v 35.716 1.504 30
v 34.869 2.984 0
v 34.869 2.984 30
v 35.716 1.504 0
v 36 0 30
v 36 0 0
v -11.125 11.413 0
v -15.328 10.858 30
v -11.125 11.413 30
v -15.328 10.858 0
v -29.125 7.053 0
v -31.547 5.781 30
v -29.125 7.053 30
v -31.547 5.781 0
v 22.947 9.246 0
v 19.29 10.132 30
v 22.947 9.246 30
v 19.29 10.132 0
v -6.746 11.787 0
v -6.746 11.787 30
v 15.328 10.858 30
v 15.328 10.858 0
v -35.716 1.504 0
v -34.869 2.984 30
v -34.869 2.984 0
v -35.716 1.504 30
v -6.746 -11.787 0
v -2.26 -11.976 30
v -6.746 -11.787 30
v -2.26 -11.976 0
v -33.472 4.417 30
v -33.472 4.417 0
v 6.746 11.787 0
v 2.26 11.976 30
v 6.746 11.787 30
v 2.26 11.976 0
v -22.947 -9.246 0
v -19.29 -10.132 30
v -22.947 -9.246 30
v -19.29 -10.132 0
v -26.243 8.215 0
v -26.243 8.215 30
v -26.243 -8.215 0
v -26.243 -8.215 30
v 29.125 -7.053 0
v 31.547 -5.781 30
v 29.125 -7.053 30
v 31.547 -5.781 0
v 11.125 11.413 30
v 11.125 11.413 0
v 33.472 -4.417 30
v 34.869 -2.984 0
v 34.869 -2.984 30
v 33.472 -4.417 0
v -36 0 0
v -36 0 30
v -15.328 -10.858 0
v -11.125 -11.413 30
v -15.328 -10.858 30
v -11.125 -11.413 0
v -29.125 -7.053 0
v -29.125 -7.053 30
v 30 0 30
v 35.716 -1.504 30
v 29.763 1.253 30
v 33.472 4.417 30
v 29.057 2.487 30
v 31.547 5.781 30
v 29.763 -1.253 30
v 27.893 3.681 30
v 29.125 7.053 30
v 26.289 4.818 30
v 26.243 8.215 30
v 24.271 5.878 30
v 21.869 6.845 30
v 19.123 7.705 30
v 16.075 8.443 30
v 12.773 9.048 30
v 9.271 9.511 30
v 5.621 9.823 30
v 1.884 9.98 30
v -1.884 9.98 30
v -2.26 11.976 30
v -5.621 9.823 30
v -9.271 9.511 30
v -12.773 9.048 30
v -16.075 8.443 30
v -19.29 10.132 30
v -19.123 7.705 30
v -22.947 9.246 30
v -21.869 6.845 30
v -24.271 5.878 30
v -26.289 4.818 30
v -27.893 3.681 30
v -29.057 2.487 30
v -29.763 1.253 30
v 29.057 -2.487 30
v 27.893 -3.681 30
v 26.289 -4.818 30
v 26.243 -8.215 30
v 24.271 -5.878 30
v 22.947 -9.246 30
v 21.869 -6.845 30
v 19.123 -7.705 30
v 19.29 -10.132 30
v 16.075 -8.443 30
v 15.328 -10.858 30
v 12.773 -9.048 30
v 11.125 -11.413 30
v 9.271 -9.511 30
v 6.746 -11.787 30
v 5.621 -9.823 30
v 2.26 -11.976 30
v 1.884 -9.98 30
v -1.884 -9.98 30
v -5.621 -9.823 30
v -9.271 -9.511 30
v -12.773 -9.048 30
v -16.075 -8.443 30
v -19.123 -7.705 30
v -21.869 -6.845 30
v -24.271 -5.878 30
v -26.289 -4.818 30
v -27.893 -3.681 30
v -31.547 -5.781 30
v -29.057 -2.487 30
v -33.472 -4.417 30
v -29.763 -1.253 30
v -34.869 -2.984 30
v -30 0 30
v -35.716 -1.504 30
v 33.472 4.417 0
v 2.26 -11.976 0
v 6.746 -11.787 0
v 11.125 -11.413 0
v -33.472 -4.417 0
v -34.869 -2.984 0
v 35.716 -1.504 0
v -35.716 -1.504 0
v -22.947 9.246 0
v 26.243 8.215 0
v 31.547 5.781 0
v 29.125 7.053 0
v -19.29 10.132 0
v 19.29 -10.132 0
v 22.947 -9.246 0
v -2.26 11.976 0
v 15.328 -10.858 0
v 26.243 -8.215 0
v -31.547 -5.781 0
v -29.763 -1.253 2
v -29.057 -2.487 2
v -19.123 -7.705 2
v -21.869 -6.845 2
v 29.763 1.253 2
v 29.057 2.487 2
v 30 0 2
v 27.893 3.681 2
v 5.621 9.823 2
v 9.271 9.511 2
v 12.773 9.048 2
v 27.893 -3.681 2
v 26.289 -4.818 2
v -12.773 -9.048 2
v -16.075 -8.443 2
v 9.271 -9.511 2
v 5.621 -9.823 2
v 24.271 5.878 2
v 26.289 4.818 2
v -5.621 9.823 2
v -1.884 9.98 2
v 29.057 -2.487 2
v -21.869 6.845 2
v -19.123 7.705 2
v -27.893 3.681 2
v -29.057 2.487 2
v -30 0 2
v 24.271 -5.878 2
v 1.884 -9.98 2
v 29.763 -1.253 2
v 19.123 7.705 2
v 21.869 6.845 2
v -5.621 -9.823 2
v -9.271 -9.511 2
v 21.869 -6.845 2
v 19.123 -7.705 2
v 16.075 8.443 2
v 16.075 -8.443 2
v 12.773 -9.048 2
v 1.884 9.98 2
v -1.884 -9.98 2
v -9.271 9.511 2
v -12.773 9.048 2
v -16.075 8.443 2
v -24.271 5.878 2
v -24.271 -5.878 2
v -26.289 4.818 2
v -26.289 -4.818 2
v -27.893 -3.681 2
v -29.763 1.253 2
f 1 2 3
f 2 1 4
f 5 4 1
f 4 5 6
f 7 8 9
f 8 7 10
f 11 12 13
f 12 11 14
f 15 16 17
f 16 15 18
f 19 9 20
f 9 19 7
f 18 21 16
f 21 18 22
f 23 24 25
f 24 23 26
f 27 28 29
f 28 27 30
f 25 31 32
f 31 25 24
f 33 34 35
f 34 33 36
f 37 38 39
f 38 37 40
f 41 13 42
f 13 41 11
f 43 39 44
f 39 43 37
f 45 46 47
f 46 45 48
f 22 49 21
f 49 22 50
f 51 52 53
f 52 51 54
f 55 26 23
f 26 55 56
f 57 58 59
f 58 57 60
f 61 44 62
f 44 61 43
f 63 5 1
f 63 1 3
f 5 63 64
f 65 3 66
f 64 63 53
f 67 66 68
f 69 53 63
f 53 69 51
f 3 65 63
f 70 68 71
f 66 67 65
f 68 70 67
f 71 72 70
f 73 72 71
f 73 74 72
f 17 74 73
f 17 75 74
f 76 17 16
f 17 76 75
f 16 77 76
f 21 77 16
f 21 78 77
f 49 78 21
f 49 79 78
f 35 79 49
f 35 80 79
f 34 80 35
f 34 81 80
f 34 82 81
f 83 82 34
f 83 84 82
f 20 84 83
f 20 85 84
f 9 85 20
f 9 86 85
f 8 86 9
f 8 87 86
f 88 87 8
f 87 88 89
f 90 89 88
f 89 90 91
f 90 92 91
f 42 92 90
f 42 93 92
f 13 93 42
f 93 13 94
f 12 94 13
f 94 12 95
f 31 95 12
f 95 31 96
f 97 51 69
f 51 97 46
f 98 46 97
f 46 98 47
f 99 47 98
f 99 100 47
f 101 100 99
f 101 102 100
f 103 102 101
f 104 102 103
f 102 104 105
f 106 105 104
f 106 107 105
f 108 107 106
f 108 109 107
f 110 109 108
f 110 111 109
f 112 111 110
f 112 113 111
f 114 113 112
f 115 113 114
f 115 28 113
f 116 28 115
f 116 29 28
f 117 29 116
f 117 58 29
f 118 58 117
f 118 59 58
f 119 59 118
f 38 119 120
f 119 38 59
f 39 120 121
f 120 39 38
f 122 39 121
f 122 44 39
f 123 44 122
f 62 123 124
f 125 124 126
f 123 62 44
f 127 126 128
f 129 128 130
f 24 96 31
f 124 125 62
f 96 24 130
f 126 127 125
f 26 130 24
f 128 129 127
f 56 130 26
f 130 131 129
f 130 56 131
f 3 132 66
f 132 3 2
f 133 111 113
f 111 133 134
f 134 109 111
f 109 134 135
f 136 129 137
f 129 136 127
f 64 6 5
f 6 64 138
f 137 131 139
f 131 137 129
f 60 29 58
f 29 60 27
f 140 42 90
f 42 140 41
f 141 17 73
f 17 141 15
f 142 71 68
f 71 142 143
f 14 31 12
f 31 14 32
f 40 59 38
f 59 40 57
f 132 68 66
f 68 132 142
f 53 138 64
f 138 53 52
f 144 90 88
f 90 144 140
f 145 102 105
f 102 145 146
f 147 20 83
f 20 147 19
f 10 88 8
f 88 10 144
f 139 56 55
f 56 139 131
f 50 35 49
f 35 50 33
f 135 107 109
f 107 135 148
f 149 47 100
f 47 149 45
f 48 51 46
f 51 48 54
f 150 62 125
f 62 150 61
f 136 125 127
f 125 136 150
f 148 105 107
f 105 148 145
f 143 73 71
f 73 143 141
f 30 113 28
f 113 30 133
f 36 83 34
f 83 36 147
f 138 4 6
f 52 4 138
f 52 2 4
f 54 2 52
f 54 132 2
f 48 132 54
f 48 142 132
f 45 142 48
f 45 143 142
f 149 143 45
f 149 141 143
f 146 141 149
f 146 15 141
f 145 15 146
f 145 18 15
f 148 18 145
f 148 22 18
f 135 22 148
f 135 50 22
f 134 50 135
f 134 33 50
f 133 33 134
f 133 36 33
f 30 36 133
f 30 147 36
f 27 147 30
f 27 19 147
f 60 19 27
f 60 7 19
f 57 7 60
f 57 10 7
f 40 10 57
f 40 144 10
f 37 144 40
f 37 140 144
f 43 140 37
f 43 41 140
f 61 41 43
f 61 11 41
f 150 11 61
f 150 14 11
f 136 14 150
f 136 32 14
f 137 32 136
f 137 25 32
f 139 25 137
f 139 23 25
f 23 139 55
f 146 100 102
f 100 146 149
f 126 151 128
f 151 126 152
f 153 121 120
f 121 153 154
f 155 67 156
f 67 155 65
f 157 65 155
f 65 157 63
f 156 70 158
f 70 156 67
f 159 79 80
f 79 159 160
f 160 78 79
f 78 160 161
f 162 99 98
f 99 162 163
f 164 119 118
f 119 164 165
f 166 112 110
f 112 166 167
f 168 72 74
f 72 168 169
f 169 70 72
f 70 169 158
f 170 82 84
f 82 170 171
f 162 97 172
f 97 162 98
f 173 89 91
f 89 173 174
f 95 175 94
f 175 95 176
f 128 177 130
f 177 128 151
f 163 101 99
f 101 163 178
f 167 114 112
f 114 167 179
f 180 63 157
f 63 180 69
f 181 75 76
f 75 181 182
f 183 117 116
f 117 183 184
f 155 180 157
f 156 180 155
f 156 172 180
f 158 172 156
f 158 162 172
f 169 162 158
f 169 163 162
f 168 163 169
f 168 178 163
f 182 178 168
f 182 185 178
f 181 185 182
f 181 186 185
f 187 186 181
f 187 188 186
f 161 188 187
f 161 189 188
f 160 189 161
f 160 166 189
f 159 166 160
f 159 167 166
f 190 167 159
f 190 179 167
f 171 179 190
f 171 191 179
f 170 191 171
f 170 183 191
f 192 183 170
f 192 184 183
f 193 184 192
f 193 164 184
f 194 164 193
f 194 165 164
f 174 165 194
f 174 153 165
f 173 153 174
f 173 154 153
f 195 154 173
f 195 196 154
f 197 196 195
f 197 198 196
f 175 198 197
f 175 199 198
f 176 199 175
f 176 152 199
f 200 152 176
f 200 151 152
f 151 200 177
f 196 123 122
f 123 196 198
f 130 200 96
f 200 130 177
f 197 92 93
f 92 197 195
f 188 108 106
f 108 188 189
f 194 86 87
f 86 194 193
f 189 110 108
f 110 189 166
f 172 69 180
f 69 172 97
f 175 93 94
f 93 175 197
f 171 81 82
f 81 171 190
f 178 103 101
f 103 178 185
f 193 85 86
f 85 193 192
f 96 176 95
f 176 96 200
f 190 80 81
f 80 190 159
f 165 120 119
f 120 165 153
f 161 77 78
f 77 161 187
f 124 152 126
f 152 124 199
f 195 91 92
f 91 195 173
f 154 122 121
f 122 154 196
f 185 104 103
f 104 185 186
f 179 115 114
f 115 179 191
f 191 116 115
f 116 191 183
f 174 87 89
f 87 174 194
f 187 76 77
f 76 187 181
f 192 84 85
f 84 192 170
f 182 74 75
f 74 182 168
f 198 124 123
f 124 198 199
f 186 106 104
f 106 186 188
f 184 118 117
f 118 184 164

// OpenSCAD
scale([3,1,1])
difference(){
cylinder(h=30,r=10+2,$fn=50);
    translate([0,0,2])
    cylinder(h=28.5,r=10,$fn=50);
}
